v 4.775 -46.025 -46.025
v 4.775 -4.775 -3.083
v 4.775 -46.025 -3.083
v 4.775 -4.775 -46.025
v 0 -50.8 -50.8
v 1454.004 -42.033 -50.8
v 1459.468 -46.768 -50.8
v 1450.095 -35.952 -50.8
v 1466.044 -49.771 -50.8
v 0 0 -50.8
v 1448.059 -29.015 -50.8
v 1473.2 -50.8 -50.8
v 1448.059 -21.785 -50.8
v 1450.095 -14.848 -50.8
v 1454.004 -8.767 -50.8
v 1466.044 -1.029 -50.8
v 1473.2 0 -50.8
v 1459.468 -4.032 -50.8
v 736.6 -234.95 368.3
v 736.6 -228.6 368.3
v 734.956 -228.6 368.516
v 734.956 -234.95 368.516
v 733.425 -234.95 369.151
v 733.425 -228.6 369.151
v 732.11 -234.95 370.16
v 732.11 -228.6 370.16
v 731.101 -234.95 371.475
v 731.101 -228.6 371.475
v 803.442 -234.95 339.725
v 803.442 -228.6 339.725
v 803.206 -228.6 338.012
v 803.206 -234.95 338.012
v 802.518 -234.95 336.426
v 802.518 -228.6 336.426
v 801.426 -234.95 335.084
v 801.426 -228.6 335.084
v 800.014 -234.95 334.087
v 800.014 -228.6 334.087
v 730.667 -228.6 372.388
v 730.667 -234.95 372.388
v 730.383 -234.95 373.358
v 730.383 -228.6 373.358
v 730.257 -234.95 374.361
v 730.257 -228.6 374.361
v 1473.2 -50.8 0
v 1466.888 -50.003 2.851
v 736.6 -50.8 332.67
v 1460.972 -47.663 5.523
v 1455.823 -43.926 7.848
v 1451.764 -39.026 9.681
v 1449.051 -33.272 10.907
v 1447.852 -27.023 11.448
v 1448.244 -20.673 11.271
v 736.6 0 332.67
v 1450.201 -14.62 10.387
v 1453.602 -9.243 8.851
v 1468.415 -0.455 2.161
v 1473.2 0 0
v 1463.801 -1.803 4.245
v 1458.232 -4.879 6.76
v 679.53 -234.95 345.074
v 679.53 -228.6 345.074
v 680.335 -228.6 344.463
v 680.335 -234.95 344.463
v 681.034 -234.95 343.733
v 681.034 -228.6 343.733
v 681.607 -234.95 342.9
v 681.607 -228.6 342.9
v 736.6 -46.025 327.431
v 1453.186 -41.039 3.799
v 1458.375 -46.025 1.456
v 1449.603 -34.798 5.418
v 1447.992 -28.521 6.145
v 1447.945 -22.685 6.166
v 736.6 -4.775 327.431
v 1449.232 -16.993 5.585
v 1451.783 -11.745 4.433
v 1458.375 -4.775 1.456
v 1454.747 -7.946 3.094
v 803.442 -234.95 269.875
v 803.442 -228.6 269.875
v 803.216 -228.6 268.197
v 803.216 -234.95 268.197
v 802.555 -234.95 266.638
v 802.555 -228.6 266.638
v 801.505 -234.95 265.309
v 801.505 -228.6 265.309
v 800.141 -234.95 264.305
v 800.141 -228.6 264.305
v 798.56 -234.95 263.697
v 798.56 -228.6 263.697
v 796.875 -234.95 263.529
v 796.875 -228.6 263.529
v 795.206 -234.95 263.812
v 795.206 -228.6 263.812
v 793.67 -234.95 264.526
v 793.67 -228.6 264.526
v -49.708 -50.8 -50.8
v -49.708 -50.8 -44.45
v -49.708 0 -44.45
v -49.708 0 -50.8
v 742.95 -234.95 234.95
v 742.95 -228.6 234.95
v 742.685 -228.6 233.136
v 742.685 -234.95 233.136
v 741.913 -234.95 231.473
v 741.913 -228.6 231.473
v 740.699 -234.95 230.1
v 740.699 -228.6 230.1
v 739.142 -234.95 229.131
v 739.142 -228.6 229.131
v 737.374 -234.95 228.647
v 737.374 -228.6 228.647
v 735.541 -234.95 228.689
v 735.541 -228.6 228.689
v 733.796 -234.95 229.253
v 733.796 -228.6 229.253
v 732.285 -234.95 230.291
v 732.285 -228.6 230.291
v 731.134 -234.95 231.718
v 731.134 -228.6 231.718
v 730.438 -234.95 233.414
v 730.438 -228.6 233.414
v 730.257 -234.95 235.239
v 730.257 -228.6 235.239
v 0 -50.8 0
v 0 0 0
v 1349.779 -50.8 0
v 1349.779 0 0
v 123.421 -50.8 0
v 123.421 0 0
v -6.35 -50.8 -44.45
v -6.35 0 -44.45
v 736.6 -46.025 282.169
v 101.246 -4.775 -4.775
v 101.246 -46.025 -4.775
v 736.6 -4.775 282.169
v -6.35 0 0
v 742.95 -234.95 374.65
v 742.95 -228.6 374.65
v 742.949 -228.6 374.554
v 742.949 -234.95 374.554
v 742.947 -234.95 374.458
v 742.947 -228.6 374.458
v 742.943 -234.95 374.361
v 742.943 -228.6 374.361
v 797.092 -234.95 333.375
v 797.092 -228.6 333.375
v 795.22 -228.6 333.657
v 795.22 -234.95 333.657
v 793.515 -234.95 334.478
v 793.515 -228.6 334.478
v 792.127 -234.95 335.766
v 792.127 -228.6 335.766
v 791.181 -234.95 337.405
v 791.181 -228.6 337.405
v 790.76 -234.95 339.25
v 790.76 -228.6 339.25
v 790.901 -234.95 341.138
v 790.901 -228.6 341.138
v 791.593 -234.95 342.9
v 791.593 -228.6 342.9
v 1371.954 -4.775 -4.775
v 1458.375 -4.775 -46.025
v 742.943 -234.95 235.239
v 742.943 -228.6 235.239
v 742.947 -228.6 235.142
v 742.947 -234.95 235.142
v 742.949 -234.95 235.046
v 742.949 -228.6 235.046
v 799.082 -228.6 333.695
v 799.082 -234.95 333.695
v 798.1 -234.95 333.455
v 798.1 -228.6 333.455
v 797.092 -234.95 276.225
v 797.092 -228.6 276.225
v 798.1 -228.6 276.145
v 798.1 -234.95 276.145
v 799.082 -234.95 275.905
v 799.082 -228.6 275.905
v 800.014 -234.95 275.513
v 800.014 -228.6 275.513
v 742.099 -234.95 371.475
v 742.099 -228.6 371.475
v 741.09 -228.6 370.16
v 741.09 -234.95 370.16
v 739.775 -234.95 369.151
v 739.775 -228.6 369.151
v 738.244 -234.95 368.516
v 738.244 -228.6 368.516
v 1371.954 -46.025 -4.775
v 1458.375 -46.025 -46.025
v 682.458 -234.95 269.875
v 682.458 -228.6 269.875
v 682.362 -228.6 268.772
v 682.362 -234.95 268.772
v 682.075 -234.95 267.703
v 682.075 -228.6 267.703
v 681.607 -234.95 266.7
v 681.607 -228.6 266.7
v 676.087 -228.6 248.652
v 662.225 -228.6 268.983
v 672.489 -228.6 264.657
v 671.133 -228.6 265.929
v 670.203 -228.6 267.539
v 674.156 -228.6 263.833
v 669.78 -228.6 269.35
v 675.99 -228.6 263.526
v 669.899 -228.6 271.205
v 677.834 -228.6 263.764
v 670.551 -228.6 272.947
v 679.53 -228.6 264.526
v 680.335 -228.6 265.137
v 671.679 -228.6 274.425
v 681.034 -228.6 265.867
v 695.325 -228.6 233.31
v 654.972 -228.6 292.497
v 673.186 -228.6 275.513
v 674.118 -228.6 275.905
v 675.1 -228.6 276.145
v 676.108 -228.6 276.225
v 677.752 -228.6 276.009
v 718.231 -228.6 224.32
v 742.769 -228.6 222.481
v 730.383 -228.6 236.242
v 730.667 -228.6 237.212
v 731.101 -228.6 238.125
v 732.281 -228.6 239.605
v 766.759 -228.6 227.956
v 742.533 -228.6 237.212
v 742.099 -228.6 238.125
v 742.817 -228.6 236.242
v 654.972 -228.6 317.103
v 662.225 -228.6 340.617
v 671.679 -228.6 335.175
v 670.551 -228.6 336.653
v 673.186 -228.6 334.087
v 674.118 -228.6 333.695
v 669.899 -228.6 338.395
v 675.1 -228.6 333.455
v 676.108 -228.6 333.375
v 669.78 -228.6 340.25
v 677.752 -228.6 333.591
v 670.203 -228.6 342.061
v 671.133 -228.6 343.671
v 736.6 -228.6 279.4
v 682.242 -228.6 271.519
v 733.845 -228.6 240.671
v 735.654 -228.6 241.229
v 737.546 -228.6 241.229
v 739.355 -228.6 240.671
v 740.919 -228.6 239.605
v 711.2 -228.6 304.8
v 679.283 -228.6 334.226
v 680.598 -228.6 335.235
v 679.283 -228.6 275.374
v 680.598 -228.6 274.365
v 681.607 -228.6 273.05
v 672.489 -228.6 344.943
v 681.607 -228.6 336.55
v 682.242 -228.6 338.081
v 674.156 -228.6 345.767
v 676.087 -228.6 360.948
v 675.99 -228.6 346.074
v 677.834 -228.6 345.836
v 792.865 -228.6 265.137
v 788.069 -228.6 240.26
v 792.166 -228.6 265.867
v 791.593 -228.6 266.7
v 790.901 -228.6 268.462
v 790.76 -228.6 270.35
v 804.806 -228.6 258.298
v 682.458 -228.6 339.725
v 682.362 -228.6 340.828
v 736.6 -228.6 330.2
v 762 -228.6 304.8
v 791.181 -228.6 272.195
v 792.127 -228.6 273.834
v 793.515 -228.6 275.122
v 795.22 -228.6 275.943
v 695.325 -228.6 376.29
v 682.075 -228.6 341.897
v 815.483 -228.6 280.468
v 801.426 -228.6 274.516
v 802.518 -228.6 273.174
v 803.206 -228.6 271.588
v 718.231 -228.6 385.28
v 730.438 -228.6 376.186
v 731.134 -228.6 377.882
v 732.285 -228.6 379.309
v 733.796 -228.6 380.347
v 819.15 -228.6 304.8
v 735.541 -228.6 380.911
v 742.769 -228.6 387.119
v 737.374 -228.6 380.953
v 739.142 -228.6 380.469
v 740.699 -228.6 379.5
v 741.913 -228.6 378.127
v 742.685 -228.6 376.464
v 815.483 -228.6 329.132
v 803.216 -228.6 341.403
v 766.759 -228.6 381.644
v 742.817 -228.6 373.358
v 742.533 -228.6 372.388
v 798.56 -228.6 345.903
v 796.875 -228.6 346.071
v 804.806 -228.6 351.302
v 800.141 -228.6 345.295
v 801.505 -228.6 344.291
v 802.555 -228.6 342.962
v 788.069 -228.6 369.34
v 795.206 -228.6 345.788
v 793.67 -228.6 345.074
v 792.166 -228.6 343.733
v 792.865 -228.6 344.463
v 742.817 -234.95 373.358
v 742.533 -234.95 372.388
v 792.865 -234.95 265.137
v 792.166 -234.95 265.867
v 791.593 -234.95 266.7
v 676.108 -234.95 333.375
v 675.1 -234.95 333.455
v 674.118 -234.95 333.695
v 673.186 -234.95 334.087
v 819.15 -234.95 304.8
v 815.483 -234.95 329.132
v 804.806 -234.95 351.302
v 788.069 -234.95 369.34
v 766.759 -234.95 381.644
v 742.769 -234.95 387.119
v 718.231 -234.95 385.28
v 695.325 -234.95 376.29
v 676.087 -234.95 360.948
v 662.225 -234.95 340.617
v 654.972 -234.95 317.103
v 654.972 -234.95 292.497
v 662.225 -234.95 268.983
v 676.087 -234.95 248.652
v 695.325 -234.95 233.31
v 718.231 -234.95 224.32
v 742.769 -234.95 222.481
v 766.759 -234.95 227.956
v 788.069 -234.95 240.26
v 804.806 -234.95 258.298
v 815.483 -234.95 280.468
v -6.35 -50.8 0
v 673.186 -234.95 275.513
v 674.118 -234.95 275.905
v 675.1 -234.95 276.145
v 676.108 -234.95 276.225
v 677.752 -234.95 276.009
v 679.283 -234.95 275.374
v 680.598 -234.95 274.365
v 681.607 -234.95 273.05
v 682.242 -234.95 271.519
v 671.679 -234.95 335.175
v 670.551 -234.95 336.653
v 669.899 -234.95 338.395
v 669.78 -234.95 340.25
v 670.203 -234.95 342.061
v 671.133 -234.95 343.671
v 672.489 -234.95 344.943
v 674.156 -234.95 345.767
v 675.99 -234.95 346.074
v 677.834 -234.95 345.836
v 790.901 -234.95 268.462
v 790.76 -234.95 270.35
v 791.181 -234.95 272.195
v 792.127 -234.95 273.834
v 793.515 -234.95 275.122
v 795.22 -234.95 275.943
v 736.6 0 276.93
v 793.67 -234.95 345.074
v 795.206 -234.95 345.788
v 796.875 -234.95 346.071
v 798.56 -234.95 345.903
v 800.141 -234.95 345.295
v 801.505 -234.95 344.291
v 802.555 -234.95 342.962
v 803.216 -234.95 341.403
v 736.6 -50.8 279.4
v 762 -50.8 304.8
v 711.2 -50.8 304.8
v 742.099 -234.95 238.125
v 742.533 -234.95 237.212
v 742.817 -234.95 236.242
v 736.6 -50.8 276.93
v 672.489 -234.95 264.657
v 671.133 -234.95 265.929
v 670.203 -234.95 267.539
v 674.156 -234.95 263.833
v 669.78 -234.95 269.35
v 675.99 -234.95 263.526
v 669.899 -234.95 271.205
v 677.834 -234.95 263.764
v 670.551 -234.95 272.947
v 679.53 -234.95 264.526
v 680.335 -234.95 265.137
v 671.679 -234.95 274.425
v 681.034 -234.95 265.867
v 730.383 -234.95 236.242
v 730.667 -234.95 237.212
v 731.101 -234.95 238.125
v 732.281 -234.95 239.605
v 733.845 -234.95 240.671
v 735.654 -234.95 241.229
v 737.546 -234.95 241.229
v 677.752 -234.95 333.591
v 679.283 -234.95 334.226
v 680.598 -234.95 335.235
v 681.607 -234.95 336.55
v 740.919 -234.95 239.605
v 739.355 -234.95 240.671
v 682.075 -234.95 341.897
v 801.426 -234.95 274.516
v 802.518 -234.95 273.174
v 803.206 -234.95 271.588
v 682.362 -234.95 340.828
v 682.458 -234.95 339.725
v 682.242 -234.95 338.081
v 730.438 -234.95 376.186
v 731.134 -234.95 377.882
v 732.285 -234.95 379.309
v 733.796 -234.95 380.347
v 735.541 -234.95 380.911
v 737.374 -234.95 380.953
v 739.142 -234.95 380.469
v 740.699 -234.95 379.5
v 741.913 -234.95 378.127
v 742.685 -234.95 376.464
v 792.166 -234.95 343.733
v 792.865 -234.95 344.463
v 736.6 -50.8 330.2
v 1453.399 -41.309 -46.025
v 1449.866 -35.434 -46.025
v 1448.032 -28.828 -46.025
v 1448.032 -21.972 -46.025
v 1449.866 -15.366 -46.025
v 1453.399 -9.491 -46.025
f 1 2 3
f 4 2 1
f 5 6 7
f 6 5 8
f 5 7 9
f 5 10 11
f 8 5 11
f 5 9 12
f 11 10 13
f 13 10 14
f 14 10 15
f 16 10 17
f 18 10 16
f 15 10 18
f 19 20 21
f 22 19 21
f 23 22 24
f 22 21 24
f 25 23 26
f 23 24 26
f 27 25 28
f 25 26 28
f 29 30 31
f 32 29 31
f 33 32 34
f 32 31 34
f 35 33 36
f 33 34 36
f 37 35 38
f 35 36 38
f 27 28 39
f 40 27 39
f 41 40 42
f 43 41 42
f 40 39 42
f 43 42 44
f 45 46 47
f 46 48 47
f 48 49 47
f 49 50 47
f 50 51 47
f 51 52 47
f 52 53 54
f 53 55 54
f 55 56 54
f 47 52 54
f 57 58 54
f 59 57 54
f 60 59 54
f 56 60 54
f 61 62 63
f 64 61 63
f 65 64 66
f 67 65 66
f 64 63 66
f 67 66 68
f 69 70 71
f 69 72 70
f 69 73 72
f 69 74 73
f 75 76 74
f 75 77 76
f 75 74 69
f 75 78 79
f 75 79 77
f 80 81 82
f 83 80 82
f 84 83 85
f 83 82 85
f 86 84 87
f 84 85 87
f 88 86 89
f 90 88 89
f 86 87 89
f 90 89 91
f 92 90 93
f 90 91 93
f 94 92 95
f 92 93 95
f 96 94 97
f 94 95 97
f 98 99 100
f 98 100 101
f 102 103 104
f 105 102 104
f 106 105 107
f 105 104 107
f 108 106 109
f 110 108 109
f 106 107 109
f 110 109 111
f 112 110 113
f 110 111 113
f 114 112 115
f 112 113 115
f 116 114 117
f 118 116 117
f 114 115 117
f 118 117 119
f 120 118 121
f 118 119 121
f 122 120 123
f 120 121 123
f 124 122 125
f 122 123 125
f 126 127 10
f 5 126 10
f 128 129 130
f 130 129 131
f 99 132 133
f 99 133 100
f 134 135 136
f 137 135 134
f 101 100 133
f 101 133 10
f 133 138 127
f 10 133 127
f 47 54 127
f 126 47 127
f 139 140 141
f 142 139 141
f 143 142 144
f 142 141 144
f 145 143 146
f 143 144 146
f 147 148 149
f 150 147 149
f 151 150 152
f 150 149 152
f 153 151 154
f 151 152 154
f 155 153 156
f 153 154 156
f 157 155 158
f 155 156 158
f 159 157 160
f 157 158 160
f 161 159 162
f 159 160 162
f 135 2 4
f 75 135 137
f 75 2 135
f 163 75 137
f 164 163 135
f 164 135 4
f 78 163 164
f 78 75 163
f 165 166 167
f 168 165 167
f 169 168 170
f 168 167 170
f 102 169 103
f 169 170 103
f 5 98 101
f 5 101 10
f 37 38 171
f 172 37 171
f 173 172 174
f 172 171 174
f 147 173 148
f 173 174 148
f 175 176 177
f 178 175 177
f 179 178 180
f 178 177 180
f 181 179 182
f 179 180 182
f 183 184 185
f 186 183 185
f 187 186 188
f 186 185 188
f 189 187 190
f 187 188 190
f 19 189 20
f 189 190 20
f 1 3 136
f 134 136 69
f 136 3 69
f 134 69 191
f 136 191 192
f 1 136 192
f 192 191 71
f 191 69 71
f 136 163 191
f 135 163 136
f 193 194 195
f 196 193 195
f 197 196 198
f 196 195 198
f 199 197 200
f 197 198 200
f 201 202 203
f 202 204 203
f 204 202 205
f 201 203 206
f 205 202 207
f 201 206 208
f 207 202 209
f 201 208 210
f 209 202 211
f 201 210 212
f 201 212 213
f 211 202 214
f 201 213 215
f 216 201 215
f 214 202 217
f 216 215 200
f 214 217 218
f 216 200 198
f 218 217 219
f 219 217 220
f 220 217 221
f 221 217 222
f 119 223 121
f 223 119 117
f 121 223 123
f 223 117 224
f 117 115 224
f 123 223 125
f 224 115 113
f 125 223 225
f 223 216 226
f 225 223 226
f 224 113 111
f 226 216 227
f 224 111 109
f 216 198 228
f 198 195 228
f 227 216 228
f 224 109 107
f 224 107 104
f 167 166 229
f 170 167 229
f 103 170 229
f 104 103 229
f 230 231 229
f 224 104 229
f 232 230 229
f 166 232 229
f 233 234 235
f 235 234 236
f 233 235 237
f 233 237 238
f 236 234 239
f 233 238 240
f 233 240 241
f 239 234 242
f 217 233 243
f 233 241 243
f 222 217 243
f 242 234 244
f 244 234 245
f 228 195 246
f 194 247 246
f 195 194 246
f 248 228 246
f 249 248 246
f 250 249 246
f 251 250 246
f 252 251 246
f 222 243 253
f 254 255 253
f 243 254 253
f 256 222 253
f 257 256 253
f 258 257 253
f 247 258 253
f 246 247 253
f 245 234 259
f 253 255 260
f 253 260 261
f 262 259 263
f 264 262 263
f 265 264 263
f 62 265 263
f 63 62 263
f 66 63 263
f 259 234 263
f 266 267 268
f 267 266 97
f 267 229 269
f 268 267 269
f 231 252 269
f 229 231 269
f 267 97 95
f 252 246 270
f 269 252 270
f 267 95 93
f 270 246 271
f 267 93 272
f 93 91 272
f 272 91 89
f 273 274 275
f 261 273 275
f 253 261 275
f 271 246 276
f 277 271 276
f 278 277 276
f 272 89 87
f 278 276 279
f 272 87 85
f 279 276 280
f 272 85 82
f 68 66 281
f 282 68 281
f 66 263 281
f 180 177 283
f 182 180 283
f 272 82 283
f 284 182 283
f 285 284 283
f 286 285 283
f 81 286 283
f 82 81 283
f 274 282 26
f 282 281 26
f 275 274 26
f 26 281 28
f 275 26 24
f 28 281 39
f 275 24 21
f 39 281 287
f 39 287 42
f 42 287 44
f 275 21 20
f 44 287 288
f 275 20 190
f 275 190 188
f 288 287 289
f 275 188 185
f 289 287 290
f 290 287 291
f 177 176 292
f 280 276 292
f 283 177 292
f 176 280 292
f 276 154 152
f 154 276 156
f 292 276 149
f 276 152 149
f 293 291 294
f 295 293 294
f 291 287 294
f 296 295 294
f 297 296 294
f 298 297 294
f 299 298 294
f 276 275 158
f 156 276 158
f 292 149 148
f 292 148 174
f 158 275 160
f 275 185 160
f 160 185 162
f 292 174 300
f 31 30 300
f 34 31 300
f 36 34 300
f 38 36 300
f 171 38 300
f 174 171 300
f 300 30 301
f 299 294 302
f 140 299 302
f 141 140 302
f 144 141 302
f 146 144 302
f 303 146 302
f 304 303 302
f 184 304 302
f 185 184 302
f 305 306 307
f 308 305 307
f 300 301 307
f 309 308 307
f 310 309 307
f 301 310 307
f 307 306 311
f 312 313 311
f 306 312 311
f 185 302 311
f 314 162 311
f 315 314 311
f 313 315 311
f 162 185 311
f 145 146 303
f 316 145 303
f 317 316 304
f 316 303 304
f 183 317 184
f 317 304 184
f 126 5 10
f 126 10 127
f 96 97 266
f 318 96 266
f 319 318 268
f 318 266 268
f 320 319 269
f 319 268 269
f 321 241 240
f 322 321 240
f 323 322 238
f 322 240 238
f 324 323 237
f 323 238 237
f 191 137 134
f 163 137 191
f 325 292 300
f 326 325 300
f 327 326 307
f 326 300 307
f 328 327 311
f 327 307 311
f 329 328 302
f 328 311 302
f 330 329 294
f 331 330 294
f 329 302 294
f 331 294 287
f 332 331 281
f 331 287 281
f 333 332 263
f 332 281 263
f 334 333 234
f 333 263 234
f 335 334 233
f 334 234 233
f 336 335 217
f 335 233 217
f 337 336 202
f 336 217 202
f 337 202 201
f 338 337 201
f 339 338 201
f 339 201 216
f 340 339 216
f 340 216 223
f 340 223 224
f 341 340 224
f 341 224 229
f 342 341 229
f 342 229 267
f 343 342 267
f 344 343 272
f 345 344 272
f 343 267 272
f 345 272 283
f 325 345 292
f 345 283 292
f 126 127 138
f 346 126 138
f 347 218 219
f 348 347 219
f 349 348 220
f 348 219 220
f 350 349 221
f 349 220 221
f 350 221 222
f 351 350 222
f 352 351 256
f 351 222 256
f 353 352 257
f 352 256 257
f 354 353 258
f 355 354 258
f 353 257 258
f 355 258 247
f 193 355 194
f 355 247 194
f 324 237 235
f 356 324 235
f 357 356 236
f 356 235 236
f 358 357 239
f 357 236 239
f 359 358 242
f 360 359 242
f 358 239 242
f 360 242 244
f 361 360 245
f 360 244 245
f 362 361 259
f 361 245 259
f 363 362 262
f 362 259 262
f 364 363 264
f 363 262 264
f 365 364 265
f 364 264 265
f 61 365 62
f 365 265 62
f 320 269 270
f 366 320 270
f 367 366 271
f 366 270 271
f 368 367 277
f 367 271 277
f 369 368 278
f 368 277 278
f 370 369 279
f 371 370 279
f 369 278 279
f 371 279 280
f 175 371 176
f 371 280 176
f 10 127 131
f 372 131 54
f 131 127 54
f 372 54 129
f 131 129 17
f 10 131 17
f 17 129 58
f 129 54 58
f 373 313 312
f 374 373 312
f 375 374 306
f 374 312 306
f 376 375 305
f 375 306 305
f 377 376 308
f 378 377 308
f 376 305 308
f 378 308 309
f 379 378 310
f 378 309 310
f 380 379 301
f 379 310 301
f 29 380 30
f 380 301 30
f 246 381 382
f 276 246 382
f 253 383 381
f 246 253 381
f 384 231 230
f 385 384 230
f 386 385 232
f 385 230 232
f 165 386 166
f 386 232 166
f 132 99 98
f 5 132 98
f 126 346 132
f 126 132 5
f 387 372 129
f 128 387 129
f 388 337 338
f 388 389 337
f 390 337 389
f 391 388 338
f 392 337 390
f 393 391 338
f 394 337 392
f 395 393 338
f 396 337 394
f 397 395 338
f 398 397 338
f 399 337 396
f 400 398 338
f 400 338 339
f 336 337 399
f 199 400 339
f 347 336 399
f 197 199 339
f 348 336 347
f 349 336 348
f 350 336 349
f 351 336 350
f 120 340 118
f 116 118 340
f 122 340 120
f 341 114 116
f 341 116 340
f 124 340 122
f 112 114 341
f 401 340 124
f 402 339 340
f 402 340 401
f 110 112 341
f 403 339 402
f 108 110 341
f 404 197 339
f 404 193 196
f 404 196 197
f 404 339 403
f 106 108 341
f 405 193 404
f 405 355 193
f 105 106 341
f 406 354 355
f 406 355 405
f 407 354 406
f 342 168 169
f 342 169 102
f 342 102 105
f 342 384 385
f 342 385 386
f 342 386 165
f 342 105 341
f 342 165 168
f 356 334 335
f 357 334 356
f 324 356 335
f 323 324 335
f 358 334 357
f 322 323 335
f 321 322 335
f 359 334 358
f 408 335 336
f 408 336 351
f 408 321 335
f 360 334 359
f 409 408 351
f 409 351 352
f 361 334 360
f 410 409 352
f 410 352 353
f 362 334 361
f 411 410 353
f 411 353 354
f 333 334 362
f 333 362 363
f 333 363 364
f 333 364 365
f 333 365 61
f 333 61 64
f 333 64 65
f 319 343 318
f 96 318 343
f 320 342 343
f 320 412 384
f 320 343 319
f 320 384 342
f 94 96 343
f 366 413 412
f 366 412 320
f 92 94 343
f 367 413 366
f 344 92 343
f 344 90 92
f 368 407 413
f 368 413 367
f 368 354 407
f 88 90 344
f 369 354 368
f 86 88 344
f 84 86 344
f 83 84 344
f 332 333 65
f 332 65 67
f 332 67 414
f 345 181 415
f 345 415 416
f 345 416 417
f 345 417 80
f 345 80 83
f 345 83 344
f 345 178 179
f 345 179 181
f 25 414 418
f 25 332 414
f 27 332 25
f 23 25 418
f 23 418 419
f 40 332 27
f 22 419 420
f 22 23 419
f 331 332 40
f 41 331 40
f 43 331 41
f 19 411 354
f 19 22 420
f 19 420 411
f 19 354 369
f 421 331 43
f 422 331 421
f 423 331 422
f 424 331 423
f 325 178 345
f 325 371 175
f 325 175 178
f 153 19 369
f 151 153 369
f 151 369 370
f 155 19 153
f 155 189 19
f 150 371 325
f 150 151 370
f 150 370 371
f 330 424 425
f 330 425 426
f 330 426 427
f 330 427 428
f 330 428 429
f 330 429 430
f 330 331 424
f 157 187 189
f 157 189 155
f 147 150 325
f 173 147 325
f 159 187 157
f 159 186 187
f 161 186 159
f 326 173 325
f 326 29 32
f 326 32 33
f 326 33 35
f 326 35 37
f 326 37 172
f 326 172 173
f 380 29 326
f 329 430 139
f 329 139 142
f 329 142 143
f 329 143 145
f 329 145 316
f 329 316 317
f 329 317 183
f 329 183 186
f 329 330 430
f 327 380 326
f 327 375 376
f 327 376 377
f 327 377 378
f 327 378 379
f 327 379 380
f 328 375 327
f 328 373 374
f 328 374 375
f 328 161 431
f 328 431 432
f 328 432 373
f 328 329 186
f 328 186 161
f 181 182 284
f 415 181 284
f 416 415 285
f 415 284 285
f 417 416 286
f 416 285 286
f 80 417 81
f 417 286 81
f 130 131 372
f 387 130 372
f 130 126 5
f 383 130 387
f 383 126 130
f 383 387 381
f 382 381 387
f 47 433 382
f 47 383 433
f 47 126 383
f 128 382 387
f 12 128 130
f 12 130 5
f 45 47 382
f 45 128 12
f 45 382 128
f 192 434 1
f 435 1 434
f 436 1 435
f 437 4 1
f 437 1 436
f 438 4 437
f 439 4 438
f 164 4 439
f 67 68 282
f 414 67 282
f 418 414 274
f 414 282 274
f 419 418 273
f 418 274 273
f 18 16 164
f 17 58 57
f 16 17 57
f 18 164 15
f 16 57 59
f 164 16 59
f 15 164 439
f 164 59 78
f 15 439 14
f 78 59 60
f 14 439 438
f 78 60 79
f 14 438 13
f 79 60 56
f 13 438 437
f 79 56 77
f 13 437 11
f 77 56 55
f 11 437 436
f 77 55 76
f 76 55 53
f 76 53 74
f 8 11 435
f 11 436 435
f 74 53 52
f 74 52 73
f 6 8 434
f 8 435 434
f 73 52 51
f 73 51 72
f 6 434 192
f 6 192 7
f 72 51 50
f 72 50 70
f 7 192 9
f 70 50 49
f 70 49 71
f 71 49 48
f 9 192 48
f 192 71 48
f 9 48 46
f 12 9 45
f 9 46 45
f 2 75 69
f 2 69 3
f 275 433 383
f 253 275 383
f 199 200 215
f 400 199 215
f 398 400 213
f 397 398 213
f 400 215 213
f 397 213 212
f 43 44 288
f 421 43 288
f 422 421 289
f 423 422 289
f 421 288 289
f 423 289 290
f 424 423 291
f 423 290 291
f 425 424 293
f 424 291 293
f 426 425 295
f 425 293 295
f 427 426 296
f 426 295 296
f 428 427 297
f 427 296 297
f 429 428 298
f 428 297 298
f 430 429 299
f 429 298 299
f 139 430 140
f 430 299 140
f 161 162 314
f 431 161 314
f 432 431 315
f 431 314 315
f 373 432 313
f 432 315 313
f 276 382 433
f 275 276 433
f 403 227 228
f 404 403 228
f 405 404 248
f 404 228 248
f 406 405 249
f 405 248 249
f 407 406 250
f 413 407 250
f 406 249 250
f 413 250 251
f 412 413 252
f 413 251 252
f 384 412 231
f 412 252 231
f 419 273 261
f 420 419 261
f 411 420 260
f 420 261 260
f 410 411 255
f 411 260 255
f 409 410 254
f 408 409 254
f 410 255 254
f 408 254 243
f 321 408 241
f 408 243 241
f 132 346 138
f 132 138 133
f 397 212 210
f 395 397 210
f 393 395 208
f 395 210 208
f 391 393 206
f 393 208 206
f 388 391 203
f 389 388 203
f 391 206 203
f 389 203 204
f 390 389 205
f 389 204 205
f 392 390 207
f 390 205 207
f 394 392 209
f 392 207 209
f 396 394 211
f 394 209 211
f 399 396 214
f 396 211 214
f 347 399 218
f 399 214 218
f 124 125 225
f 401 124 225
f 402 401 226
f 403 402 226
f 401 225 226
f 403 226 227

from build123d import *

# Parameters (mm, degrees)
F1_DEPTH  = 50.8
F2_T      = -4.7752
F4_DEPTH  = 50.8
F6_DEPTH  = 177.8
F7_R      = 82.55
F8_DEPTH  = 6.35
F10_DEPTH = 50.8


with BuildPart() as f1:
    # F0 (on Front) → F1 (new body)
    with BuildSketch(Plane.XZ):
        Polygon((736.6, 332.6702846865), (0, 0), (123.4210126066, 0), (736.6, 276.9297153135), align=None)
        Polygon((1473.2, 0), (736.6, 332.6702846865), (736.6, 276.9297153135), (1349.7789873934, 0), align=None)
        Polygon((123.4210126066, 0), (0, 0), (0, -50.8), (1473.2, -50.8), (1473.2, 0), (1349.7789873934, 0), align=None)
    extrude(amount=F1_DEPTH)

    # F2
    f2_openings = [f1.faces().sort_by_distance(p)[0] for p in [
        (1473.2, -25.4, -25.4),
    ]]
    offset(amount=F2_T, openings=f2_openings, kind=Kind.INTERSECTION)

    # F3 (on Top) → F4 (cut, symmetric)
    with BuildSketch(Plane.XY):
        with BuildLine():
            ThreePointArc((1473.2, 0), (1447.8, -25.4), (1473.2, -50.8))
            Line((1473.2, -50.8), (1473.2, 0))
        make_face()
        with BuildLine():
            Line((1473.2, 0), (1473.2, -50.8))
            ThreePointArc((1473.2, -50.8), (1491.1605122421, -43.3605122421), (1498.6, -25.4))
            ThreePointArc((1498.6, -25.4), (1491.1605122421, -7.4394877579), (1473.2, 0))
        make_face()
    extrude(amount=F4_DEPTH, both=True, mode=Mode.SUBTRACT)

    # F5 (on face) → F6 (join)
    with BuildSketch(Plane.XZ.offset(50.8)):
        Polygon((736.6, 279.4), (736.6, 304.8), (711.2, 304.8), align=None)
        Polygon((711.2, 304.8), (736.6, 304.8), (736.6, 330.2), align=None)
        Polygon((736.6, 330.2), (736.6, 304.8), (762, 304.8), align=None)
        Polygon((762, 304.8), (736.6, 304.8), (736.6, 279.4), align=None)
    extrude(amount=F6_DEPTH)

    # F7 (on face) → F8 (join)
    with BuildSketch(Plane.XZ.offset(228.6)):
        with Locations((736.6, 304.8)):
            Circle(F7_R)
        with BuildLine():
            ThreePointArc((742.95, 374.65), (742.9483589606, 374.5056445122), (742.9434366908, 374.3613636364))
            ThreePointArc((742.9434366908, 374.3613636364), (771.525, 365.2918744543), (793.6701896856, 345.0742591397))
            ThreePointArc((793.6701896856, 345.0742591397), (800.141038415, 345.2950178762), (803.4418744543, 339.725))
            ThreePointArc((803.4418744543, 339.725), (802.5175368427, 336.4258050001), (800.0136263764, 334.0871044967))
            ThreePointArc((800.0136263764, 334.0871044967), (804.8219330655, 319.7930099982), (806.45, 304.8))
            ThreePointArc((806.45, 304.8), (804.8219330655, 289.8069900018), (800.0136263764, 275.5128955033))
            ThreePointArc((800.0136263764, 275.5128955033), (802.5175368427, 273.1741949999), (803.4418744543, 269.875))
            ThreePointArc((803.4418744543, 269.875), (800.141038415, 264.3049821238), (793.6701896856, 264.5257408603))
            ThreePointArc((793.6701896856, 264.5257408603), (771.525, 244.3081255457), (742.9434366908, 235.2386363636))
            ThreePointArc((742.9434366908, 235.2386363636), (742.9483589606, 235.0943554878), (742.95, 234.95))
            ThreePointArc((742.95, 234.95), (736.4556445122, 228.6016410394), (730.2565633092, 235.2386363636))
            ThreePointArc((730.2565633092, 235.2386363636), (701.675, 244.3081255457), (679.5298103144, 264.5257408603))
            ThreePointArc((679.5298103144, 264.5257408603), (670.6088642316, 266.7), (673.1863736236, 275.5128955033))
            ThreePointArc((673.1863736236, 275.5128955033), (666.75, 304.8), (673.1863736236, 334.0871044967))
            ThreePointArc((673.1863736236, 334.0871044967), (670.6088642316, 342.9), (679.5298103144, 345.0742591397))
            ThreePointArc((679.5298103144, 345.0742591397), (701.675, 365.2918744543), (730.2565633092, 374.3613636364))
            ThreePointArc((730.2565633092, 374.3613636364), (736.4556445122, 380.9983589606), (742.95, 374.65))
        make_face(mode=Mode.SUBTRACT)
        with BuildLine():
            ThreePointArc((742.099261314, 371.475), (739.775, 369.150738686), (736.6, 368.3))
            ThreePointArc((736.6, 368.3), (733.425, 369.150738686), (731.100738686, 371.475))
            Line((731.100738686, 371.475), (681.6073868597, 342.9))
            ThreePointArc((681.6073868597, 342.9), (682.2417545426, 341.3685009364), (682.4581255457, 339.725))
            ThreePointArc((682.4581255457, 339.725), (680.5982536062, 335.2348719395), (676.1081255457, 333.375))
            Line((676.1081255457, 333.375), (676.1081255457, 276.225))
            ThreePointArc((676.1081255457, 276.225), (680.5982536062, 274.3651280605), (682.4581255457, 269.875))
            ThreePointArc((682.4581255457, 269.875), (682.2417545426, 268.2314990636), (681.6073868597, 266.7))
            Line((681.6073868597, 266.7), (731.100738686, 238.125))
            ThreePointArc((731.100738686, 238.125), (736.6, 241.3), (742.099261314, 238.125))
            Line((742.099261314, 238.125), (791.5926131403, 266.7))
            ThreePointArc((791.5926131403, 266.7), (791.5926131403, 273.05), (797.0918744543, 276.225))
            Line((797.0918744543, 276.225), (797.0918744543, 333.375))
            ThreePointArc((797.0918744543, 333.375), (791.5926131403, 336.55), (791.5926131403, 342.9))
            Line((791.5926131403, 342.9), (742.099261314, 371.475))
        make_face()
        Polygon((736.6, 279.4), (711.2, 304.8), (736.6, 330.2), (762, 304.8), align=None, mode=Mode.SUBTRACT)
        Polygon((736.6, 330.2), (711.2, 304.8), (736.6, 279.4), (762, 304.8), align=None)
        with BuildLine():
            Line((681.6073868597, 342.9), (731.100738686, 371.475))
            ThreePointArc((731.100738686, 371.475), (730.5053180749, 372.867487102), (730.2565633092, 374.3613636364))
            ThreePointArc((730.2565633092, 374.3613636364), (701.675, 365.2918744543), (679.5298103144, 345.0742591397))
            ThreePointArc((679.5298103144, 345.0742591397), (680.6991679605, 344.1118929261), (681.6073868597, 342.9))
        make_face()
        with BuildLine():
            ThreePointArc((742.9434366908, 374.3613636364), (742.6946819251, 372.867487102), (742.099261314, 371.475))
            Line((742.099261314, 371.475), (791.5926131403, 342.9))
            ThreePointArc((791.5926131403, 342.9), (792.5008320395, 344.1118929261), (793.6701896856, 345.0742591397))
            ThreePointArc((793.6701896856, 345.0742591397), (771.525, 365.2918744543), (742.9434366908, 374.3613636364))
        make_face()
        with BuildLine():
            ThreePointArc((800.0136263764, 334.0871044967), (798.5955139647, 333.5555941759), (797.0918744543, 333.375))
            Line((797.0918744543, 333.375), (797.0918744543, 276.225))
            ThreePointArc((797.0918744543, 276.225), (798.5955139647, 276.0444058241), (800.0136263764, 275.5128955033))
            ThreePointArc((800.0136263764, 275.5128955033), (804.8219330655, 289.8069900018), (806.45, 304.8))
            ThreePointArc((806.45, 304.8), (804.8219330655, 319.7930099982), (800.0136263764, 334.0871044967))
        make_face()
        with BuildLine():
            ThreePointArc((793.6701896856, 264.5257408603), (792.5008320395, 265.4881070739), (791.5926131403, 266.7))
            Line((791.5926131403, 266.7), (742.099261314, 238.125))
            ThreePointArc((742.099261314, 238.125), (742.6946819251, 236.732512898), (742.9434366908, 235.2386363636))
            ThreePointArc((742.9434366908, 235.2386363636), (771.525, 244.3081255457), (793.6701896856, 264.5257408603))
        make_face()
        with BuildLine():
            ThreePointArc((681.6073868597, 266.7), (680.6991679605, 265.4881070739), (679.5298103144, 264.5257408603))
            ThreePointArc((679.5298103144, 264.5257408603), (701.675, 244.3081255457), (730.2565633092, 235.2386363636))
            ThreePointArc((730.2565633092, 235.2386363636), (730.5053180749, 236.732512898), (731.100738686, 238.125))
            Line((731.100738686, 238.125), (681.6073868597, 266.7))
        make_face()
        with BuildLine():
            ThreePointArc((676.1081255457, 333.375), (674.6044860353, 333.5555941759), (673.1863736236, 334.0871044967))
            ThreePointArc((673.1863736236, 334.0871044967), (666.75, 304.8), (673.1863736236, 275.5128955033))
            ThreePointArc((673.1863736236, 275.5128955033), (674.6044860353, 276.0444058241), (676.1081255457, 276.225))
            Line((676.1081255457, 276.225), (676.1081255457, 333.375))
        make_face()
    extrude(amount=F8_DEPTH)


with BuildPart() as f10:
    # F9 (on face) → F10 (new body)
    with BuildSketch(Plane.XZ.offset(50.8)):
        Polygon((-49.7083738446, -50.8), (0, -50.8), (0, 0), (-6.35, 0), (-6.35, -44.45), (-49.7083738446, -44.45), align=None)
    extrude(amount=-F10_DEPTH)


solid = Compound([f1.part, f10.part])
